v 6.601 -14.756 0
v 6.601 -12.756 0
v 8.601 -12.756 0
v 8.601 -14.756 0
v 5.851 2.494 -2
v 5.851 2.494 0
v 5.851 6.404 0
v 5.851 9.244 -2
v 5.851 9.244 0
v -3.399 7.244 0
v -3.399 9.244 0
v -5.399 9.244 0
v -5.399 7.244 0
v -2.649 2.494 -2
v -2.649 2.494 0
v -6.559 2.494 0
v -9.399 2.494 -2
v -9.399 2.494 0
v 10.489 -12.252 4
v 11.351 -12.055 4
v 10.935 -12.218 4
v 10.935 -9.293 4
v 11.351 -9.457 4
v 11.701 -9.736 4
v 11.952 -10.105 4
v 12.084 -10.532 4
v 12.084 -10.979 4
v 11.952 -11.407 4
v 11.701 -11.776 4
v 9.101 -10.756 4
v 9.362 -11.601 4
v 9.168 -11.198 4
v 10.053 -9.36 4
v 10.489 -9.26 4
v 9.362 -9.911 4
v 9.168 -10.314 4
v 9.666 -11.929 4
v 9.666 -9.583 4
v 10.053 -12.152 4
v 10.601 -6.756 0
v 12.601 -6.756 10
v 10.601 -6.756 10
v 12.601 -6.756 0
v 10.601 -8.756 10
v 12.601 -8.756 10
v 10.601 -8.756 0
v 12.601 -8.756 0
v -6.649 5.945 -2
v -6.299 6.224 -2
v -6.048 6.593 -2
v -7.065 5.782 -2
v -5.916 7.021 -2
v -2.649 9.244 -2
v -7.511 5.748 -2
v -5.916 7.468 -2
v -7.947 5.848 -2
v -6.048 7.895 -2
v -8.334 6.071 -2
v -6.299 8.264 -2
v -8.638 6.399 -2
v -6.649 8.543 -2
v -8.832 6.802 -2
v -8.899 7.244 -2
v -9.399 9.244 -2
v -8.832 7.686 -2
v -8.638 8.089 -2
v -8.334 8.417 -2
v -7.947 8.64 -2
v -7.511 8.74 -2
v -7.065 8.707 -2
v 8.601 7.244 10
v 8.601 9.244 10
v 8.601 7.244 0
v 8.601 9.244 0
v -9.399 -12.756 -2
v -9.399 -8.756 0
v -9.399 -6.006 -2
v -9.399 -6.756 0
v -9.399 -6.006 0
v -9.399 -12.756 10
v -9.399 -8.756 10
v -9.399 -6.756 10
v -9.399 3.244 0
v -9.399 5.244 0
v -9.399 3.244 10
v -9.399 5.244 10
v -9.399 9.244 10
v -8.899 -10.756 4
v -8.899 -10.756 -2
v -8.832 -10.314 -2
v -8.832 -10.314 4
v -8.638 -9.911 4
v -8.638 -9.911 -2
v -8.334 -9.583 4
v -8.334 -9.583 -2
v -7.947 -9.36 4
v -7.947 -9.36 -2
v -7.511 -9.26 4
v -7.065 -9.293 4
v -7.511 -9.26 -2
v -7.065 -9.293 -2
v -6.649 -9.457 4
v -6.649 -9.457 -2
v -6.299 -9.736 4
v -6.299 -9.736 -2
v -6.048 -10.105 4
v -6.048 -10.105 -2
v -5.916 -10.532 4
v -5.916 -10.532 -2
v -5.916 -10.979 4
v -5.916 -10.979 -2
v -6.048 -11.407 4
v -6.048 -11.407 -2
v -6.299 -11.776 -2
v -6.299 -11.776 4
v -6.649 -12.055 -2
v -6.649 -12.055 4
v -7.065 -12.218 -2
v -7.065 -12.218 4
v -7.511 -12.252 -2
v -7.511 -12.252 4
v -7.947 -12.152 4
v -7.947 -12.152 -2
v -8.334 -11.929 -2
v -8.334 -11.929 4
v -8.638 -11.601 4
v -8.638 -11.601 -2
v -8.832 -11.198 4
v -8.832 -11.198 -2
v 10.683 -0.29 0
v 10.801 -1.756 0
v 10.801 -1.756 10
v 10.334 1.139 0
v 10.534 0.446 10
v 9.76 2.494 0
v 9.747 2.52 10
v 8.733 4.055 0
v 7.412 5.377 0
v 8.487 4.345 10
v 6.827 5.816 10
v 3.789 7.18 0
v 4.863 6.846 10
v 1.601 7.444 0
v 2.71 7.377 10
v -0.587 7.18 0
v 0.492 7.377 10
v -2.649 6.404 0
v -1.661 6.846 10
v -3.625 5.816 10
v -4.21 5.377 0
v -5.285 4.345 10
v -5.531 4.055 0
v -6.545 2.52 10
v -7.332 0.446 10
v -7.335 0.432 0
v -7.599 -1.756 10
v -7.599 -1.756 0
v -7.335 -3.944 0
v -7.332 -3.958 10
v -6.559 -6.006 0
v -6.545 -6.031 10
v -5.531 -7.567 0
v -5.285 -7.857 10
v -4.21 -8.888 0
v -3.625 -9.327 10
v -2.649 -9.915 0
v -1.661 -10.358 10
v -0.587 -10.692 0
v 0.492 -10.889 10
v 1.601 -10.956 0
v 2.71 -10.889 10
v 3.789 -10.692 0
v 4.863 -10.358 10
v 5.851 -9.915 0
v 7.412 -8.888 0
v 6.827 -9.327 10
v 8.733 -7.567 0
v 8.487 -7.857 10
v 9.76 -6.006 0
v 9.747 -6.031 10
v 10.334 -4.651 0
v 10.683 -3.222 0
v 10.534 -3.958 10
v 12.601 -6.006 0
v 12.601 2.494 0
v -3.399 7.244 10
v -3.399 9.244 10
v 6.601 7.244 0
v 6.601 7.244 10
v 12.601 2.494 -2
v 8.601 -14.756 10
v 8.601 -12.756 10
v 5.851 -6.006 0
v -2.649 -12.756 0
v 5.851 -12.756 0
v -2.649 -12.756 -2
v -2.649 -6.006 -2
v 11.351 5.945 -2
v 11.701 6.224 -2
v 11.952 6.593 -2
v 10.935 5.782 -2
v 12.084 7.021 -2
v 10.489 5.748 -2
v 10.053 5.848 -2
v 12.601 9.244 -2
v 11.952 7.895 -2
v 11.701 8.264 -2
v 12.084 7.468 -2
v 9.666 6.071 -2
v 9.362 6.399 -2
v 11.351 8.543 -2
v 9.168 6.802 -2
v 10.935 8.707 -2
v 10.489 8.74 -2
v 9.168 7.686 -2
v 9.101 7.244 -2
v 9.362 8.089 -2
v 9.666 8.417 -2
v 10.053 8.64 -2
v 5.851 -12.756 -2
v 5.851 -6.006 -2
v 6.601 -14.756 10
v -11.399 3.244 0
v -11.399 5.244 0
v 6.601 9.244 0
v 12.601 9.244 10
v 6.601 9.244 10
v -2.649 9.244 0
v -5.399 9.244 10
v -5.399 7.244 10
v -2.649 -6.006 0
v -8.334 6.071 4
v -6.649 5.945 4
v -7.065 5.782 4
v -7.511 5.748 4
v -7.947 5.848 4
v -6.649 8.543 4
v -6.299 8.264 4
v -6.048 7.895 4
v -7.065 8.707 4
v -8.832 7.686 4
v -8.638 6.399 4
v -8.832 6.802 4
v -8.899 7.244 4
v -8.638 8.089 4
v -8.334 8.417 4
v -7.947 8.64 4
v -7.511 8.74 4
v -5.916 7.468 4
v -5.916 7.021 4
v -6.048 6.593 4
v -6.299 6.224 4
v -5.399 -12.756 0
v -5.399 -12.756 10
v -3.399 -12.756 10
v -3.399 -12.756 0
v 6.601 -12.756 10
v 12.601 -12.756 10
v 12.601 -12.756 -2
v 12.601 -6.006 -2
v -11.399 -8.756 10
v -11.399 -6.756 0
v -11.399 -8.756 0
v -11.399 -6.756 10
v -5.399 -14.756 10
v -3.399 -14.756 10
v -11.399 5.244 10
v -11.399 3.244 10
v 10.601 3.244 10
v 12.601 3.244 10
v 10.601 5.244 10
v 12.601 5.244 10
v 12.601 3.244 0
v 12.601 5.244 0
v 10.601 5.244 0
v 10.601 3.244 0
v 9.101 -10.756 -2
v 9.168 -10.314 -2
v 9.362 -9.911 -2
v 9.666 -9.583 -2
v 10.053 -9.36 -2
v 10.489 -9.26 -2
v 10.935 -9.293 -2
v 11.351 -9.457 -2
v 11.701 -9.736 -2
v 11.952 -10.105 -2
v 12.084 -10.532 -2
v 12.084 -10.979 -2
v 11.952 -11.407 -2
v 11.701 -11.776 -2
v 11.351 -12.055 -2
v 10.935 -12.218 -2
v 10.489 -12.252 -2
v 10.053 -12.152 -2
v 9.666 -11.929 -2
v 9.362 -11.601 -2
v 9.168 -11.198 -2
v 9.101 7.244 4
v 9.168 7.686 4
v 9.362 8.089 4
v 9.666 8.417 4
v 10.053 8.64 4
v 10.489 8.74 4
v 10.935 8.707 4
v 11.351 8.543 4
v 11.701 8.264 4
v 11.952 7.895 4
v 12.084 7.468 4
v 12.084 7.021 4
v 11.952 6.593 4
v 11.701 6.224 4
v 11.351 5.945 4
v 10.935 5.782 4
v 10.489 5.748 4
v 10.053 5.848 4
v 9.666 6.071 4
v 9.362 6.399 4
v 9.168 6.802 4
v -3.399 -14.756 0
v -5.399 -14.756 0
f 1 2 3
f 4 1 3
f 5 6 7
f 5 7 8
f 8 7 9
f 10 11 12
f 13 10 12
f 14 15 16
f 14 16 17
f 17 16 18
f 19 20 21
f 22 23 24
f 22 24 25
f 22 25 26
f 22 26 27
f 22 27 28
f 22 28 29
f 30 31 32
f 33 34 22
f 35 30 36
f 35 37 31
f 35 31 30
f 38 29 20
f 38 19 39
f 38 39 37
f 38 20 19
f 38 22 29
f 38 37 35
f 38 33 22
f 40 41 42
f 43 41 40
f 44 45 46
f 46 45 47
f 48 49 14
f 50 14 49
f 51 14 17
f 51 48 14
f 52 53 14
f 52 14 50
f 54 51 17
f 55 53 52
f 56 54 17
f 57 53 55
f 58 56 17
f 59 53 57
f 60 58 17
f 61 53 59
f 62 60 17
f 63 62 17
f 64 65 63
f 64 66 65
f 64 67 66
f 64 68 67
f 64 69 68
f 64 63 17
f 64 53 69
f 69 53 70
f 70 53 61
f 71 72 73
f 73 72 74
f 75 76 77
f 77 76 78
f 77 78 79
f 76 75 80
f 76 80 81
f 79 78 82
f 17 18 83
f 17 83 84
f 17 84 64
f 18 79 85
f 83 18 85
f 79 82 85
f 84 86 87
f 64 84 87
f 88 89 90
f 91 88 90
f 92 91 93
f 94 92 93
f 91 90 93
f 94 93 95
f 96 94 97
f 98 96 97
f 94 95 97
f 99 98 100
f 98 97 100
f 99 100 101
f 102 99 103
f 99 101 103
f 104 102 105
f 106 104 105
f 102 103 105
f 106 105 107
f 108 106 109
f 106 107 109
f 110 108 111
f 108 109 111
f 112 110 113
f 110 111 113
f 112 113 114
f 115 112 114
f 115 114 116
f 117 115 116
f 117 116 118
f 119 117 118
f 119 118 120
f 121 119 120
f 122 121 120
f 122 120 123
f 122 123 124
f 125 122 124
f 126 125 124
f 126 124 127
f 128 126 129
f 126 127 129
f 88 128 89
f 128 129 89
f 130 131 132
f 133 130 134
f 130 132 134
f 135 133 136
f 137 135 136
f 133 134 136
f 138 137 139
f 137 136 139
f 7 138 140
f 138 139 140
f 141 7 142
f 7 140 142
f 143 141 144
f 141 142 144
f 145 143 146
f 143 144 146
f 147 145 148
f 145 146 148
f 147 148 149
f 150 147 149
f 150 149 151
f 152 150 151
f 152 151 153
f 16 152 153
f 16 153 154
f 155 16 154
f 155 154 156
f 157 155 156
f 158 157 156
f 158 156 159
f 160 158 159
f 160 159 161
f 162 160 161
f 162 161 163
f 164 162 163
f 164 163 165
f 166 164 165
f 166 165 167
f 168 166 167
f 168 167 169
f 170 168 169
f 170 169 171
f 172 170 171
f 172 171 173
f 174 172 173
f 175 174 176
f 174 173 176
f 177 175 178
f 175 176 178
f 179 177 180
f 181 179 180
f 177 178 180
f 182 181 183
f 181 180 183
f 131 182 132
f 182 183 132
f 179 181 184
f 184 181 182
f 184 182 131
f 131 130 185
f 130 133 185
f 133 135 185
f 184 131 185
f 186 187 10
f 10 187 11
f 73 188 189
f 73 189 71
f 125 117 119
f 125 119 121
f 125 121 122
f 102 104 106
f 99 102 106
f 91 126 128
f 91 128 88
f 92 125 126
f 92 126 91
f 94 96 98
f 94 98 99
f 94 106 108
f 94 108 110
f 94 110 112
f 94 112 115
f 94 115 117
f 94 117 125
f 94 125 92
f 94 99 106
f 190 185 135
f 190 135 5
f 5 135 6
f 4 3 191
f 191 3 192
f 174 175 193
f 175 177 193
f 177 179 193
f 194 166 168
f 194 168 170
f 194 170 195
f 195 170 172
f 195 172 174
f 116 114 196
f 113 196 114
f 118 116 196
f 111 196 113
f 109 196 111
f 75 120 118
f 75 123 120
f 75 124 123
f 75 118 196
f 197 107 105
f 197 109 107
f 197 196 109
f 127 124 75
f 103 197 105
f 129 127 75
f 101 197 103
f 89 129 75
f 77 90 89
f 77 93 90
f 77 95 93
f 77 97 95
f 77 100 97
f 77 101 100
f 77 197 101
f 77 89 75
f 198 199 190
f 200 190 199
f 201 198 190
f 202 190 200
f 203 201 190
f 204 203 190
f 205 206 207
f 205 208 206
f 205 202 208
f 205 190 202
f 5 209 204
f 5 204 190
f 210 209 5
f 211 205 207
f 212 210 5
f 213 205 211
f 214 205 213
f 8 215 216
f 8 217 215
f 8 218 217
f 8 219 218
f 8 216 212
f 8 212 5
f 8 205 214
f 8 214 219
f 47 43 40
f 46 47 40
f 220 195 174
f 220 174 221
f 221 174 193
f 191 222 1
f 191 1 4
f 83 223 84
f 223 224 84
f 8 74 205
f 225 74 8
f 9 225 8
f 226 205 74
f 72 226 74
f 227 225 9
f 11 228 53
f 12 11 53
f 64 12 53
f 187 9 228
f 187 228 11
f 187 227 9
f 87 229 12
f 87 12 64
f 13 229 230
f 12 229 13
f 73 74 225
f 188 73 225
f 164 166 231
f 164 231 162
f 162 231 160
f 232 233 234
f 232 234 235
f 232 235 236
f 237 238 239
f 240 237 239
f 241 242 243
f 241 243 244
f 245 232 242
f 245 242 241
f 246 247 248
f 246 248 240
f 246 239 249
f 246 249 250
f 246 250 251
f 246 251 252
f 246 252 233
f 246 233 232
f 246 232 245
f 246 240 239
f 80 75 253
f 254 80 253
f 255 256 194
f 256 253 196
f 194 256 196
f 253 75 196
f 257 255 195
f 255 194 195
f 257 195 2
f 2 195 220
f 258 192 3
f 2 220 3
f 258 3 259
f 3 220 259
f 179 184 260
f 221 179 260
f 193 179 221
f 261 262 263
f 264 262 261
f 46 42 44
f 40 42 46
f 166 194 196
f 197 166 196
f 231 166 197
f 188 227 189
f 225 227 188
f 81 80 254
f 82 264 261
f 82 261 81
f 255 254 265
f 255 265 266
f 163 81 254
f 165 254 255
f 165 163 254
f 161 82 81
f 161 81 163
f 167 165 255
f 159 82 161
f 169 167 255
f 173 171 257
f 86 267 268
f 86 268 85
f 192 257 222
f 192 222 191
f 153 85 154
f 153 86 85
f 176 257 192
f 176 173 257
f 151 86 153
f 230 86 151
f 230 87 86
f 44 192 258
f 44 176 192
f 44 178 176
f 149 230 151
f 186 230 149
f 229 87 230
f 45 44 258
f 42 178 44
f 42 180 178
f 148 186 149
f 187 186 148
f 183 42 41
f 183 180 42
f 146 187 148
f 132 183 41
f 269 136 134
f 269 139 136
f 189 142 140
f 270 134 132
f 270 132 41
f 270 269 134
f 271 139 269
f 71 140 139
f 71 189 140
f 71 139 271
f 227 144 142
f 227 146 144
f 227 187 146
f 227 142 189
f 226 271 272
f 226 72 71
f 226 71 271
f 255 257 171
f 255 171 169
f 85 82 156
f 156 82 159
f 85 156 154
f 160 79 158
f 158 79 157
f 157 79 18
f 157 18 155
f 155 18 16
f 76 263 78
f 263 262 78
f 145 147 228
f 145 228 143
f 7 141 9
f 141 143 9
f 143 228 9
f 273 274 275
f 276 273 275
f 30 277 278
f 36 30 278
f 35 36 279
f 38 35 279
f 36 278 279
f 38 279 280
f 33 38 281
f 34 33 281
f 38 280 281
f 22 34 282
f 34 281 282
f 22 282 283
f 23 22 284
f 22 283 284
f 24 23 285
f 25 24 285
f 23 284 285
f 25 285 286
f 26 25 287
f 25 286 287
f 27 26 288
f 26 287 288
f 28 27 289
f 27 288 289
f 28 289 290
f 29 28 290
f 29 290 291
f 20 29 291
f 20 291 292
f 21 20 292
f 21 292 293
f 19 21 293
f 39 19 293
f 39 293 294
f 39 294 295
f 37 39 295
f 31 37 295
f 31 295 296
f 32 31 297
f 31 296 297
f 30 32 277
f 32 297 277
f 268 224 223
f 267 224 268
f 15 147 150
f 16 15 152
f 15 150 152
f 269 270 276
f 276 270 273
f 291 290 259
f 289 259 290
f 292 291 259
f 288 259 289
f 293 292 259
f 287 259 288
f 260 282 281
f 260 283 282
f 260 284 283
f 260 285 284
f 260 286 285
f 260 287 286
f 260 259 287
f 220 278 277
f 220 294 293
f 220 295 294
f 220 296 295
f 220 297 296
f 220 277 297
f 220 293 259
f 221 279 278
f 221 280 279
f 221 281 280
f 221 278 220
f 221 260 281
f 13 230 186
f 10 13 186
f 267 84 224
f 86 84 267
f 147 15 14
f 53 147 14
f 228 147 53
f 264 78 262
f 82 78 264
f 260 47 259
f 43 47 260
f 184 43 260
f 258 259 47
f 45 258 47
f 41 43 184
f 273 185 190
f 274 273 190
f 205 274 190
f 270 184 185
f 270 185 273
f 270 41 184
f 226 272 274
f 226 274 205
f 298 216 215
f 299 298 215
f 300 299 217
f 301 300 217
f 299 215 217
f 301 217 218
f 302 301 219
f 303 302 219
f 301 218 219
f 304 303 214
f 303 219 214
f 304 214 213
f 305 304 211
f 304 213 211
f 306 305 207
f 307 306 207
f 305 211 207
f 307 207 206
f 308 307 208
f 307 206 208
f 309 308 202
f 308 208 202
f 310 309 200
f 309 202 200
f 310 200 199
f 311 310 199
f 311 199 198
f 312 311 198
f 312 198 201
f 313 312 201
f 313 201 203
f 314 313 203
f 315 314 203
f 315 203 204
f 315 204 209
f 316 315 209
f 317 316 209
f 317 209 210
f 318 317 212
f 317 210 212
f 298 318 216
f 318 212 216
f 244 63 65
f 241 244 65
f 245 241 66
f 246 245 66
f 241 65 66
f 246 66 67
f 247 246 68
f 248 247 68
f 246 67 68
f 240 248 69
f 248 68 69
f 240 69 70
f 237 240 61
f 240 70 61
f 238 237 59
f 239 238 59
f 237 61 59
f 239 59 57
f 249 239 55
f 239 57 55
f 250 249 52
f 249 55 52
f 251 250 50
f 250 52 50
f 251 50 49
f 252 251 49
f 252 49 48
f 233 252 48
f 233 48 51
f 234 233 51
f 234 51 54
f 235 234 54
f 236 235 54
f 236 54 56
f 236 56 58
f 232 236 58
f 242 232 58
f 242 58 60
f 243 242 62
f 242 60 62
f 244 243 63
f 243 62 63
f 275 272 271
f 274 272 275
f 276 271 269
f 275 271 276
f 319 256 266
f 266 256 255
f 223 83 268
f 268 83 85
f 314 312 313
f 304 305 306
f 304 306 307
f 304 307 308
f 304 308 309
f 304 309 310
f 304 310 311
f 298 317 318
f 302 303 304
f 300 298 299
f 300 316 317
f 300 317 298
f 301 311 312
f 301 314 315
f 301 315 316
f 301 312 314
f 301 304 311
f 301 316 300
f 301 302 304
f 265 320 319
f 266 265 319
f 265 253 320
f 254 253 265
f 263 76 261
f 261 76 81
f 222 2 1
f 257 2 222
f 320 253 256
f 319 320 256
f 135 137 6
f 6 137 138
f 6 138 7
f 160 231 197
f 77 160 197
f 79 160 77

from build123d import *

# Parameters (mm, degrees)
SKETCH1_W           = 22
SKETCH1_H           = 22
BOSS_EXTRUDE1_DEPTH = 10
SKETCH3_W           = 2
SKETCH3_H           = 10
BOSS_EXTRUDE2_DEPTH = 2
SKETCH4_W           = 10
SKETCH4_H           = 2
BOSS_EXTRUDE3_DEPTH = 2
SKETCH5_W           = 10
SKETCH5_H           = 2
CUT_EXTRUDE1_DEPTH  = 2
SKETCH6_W           = 2
SKETCH6_H           = 10
CUT_EXTRUDE2_DEPTH  = 2
SKETCH7_R           = 9.2
CUT_EXTRUDE3_DEPTH  = 11
SKETCH8_W           = 6.75
SKETCH8_H           = 6.75
BOSS_EXTRUDE4_DEPTH = 2
SKETCH9_R           = 1.5
CUT_EXTRUDE6_DEPTH  = 6


with BuildPart() as part:
    # Sketch1 → Boss-Extrude1 (new body)
    with BuildSketch(Plane.XY):
        with Locations((1.600938967, -1.755868545)):
            Rectangle(SKETCH1_W, SKETCH1_H)
    extrude(amount=BOSS_EXTRUDE1_DEPTH)

    # Sketch3 → Boss-Extrude2 (add)
    with BuildSketch(Plane.XZ.offset(12.755868545)):
        with Locations((7.600938967, 5)):
            Rectangle(SKETCH3_W, SKETCH3_H)
        with Locations((-4.399061033, 5)):
            Rectangle(SKETCH3_W, SKETCH3_H)
    extrude(amount=BOSS_EXTRUDE2_DEPTH)

    # Sketch4 → Boss-Extrude3 (add)
    with BuildSketch(Plane.ZY.offset(9.399061033)):
        with Locations((5, 4.244131455)):
            Rectangle(SKETCH4_W, SKETCH4_H)
        with Locations((5, -7.755868545)):
            Rectangle(SKETCH4_W, SKETCH4_H)
    extrude(amount=BOSS_EXTRUDE3_DEPTH)

    # Sketch5 → Cut-Extrude1 (cut)
    with BuildSketch(Plane(origin=(12.600938967, 0, 0), x_dir=(0, 0, -1), z_dir=(1, 0, 0))):
        with Locations((-5, 4.244131455)):
            Rectangle(SKETCH5_W, SKETCH5_H)
        with Locations((-5, -7.755868545)):
            Rectangle(SKETCH5_W, SKETCH5_H)
    extrude(amount=-CUT_EXTRUDE1_DEPTH, mode=Mode.SUBTRACT)

    # Sketch6 → Cut-Extrude2 (cut)
    with BuildSketch(Plane(origin=(0, 9.244131455, 0), x_dir=(1, 0, 0), z_dir=(0, 1, 0))):
        with Locations((-4.399061033, -5)):
            Rectangle(SKETCH6_W, SKETCH6_H)
        with Locations((7.600938967, -5)):
            Rectangle(SKETCH6_W, SKETCH6_H)
    extrude(amount=-CUT_EXTRUDE2_DEPTH, mode=Mode.SUBTRACT)

    # Sketch7 → Cut-Extrude3 (cut, through all)
    with BuildSketch(Plane.XY.offset(10)):
        with Locations((1.600938967, -1.755868545)):
            Circle(SKETCH7_R)
    extrude(amount=-CUT_EXTRUDE3_DEPTH, mode=Mode.SUBTRACT)

    # Sketch8 → Boss-Extrude4 (add)
    with BuildSketch(Plane(origin=(0, 0, 0), x_dir=(-1, 0, 0), z_dir=(0, 0, -1))):
        with Locations((6.024061033, 5.869131455)):
            Rectangle(SKETCH8_W, SKETCH8_H)
        with Locations((-9.225938967, 5.869131455)):
            Rectangle(SKETCH8_W, SKETCH8_H)
        with Locations((-9.225938967, -9.380868545)):
            Rectangle(SKETCH8_W, SKETCH8_H)
        with Locations((6.024061033, -9.380868545)):
            Rectangle(SKETCH8_W, SKETCH8_H)
    extrude(amount=BOSS_EXTRUDE4_DEPTH)

    # Sketch9 → Cut-Extrude6 (cut)
    with BuildSketch(Plane(origin=(0, 0, -2), x_dir=(-1, 0, 0), z_dir=(0, 0, -1))):
        with Locations((7.399061033, -10.755868545)):
            Circle(SKETCH9_R)
        with Locations((-10.600938967, -10.755868545)):
            Circle(SKETCH9_R)
        with Locations((7.399061033, 7.244131455)):
            Circle(SKETCH9_R)
        with Locations((-10.600938967, 7.244131455)):
            Circle(SKETCH9_R)
    extrude(amount=-CUT_EXTRUDE6_DEPTH, mode=Mode.SUBTRACT)


solid = part.part
